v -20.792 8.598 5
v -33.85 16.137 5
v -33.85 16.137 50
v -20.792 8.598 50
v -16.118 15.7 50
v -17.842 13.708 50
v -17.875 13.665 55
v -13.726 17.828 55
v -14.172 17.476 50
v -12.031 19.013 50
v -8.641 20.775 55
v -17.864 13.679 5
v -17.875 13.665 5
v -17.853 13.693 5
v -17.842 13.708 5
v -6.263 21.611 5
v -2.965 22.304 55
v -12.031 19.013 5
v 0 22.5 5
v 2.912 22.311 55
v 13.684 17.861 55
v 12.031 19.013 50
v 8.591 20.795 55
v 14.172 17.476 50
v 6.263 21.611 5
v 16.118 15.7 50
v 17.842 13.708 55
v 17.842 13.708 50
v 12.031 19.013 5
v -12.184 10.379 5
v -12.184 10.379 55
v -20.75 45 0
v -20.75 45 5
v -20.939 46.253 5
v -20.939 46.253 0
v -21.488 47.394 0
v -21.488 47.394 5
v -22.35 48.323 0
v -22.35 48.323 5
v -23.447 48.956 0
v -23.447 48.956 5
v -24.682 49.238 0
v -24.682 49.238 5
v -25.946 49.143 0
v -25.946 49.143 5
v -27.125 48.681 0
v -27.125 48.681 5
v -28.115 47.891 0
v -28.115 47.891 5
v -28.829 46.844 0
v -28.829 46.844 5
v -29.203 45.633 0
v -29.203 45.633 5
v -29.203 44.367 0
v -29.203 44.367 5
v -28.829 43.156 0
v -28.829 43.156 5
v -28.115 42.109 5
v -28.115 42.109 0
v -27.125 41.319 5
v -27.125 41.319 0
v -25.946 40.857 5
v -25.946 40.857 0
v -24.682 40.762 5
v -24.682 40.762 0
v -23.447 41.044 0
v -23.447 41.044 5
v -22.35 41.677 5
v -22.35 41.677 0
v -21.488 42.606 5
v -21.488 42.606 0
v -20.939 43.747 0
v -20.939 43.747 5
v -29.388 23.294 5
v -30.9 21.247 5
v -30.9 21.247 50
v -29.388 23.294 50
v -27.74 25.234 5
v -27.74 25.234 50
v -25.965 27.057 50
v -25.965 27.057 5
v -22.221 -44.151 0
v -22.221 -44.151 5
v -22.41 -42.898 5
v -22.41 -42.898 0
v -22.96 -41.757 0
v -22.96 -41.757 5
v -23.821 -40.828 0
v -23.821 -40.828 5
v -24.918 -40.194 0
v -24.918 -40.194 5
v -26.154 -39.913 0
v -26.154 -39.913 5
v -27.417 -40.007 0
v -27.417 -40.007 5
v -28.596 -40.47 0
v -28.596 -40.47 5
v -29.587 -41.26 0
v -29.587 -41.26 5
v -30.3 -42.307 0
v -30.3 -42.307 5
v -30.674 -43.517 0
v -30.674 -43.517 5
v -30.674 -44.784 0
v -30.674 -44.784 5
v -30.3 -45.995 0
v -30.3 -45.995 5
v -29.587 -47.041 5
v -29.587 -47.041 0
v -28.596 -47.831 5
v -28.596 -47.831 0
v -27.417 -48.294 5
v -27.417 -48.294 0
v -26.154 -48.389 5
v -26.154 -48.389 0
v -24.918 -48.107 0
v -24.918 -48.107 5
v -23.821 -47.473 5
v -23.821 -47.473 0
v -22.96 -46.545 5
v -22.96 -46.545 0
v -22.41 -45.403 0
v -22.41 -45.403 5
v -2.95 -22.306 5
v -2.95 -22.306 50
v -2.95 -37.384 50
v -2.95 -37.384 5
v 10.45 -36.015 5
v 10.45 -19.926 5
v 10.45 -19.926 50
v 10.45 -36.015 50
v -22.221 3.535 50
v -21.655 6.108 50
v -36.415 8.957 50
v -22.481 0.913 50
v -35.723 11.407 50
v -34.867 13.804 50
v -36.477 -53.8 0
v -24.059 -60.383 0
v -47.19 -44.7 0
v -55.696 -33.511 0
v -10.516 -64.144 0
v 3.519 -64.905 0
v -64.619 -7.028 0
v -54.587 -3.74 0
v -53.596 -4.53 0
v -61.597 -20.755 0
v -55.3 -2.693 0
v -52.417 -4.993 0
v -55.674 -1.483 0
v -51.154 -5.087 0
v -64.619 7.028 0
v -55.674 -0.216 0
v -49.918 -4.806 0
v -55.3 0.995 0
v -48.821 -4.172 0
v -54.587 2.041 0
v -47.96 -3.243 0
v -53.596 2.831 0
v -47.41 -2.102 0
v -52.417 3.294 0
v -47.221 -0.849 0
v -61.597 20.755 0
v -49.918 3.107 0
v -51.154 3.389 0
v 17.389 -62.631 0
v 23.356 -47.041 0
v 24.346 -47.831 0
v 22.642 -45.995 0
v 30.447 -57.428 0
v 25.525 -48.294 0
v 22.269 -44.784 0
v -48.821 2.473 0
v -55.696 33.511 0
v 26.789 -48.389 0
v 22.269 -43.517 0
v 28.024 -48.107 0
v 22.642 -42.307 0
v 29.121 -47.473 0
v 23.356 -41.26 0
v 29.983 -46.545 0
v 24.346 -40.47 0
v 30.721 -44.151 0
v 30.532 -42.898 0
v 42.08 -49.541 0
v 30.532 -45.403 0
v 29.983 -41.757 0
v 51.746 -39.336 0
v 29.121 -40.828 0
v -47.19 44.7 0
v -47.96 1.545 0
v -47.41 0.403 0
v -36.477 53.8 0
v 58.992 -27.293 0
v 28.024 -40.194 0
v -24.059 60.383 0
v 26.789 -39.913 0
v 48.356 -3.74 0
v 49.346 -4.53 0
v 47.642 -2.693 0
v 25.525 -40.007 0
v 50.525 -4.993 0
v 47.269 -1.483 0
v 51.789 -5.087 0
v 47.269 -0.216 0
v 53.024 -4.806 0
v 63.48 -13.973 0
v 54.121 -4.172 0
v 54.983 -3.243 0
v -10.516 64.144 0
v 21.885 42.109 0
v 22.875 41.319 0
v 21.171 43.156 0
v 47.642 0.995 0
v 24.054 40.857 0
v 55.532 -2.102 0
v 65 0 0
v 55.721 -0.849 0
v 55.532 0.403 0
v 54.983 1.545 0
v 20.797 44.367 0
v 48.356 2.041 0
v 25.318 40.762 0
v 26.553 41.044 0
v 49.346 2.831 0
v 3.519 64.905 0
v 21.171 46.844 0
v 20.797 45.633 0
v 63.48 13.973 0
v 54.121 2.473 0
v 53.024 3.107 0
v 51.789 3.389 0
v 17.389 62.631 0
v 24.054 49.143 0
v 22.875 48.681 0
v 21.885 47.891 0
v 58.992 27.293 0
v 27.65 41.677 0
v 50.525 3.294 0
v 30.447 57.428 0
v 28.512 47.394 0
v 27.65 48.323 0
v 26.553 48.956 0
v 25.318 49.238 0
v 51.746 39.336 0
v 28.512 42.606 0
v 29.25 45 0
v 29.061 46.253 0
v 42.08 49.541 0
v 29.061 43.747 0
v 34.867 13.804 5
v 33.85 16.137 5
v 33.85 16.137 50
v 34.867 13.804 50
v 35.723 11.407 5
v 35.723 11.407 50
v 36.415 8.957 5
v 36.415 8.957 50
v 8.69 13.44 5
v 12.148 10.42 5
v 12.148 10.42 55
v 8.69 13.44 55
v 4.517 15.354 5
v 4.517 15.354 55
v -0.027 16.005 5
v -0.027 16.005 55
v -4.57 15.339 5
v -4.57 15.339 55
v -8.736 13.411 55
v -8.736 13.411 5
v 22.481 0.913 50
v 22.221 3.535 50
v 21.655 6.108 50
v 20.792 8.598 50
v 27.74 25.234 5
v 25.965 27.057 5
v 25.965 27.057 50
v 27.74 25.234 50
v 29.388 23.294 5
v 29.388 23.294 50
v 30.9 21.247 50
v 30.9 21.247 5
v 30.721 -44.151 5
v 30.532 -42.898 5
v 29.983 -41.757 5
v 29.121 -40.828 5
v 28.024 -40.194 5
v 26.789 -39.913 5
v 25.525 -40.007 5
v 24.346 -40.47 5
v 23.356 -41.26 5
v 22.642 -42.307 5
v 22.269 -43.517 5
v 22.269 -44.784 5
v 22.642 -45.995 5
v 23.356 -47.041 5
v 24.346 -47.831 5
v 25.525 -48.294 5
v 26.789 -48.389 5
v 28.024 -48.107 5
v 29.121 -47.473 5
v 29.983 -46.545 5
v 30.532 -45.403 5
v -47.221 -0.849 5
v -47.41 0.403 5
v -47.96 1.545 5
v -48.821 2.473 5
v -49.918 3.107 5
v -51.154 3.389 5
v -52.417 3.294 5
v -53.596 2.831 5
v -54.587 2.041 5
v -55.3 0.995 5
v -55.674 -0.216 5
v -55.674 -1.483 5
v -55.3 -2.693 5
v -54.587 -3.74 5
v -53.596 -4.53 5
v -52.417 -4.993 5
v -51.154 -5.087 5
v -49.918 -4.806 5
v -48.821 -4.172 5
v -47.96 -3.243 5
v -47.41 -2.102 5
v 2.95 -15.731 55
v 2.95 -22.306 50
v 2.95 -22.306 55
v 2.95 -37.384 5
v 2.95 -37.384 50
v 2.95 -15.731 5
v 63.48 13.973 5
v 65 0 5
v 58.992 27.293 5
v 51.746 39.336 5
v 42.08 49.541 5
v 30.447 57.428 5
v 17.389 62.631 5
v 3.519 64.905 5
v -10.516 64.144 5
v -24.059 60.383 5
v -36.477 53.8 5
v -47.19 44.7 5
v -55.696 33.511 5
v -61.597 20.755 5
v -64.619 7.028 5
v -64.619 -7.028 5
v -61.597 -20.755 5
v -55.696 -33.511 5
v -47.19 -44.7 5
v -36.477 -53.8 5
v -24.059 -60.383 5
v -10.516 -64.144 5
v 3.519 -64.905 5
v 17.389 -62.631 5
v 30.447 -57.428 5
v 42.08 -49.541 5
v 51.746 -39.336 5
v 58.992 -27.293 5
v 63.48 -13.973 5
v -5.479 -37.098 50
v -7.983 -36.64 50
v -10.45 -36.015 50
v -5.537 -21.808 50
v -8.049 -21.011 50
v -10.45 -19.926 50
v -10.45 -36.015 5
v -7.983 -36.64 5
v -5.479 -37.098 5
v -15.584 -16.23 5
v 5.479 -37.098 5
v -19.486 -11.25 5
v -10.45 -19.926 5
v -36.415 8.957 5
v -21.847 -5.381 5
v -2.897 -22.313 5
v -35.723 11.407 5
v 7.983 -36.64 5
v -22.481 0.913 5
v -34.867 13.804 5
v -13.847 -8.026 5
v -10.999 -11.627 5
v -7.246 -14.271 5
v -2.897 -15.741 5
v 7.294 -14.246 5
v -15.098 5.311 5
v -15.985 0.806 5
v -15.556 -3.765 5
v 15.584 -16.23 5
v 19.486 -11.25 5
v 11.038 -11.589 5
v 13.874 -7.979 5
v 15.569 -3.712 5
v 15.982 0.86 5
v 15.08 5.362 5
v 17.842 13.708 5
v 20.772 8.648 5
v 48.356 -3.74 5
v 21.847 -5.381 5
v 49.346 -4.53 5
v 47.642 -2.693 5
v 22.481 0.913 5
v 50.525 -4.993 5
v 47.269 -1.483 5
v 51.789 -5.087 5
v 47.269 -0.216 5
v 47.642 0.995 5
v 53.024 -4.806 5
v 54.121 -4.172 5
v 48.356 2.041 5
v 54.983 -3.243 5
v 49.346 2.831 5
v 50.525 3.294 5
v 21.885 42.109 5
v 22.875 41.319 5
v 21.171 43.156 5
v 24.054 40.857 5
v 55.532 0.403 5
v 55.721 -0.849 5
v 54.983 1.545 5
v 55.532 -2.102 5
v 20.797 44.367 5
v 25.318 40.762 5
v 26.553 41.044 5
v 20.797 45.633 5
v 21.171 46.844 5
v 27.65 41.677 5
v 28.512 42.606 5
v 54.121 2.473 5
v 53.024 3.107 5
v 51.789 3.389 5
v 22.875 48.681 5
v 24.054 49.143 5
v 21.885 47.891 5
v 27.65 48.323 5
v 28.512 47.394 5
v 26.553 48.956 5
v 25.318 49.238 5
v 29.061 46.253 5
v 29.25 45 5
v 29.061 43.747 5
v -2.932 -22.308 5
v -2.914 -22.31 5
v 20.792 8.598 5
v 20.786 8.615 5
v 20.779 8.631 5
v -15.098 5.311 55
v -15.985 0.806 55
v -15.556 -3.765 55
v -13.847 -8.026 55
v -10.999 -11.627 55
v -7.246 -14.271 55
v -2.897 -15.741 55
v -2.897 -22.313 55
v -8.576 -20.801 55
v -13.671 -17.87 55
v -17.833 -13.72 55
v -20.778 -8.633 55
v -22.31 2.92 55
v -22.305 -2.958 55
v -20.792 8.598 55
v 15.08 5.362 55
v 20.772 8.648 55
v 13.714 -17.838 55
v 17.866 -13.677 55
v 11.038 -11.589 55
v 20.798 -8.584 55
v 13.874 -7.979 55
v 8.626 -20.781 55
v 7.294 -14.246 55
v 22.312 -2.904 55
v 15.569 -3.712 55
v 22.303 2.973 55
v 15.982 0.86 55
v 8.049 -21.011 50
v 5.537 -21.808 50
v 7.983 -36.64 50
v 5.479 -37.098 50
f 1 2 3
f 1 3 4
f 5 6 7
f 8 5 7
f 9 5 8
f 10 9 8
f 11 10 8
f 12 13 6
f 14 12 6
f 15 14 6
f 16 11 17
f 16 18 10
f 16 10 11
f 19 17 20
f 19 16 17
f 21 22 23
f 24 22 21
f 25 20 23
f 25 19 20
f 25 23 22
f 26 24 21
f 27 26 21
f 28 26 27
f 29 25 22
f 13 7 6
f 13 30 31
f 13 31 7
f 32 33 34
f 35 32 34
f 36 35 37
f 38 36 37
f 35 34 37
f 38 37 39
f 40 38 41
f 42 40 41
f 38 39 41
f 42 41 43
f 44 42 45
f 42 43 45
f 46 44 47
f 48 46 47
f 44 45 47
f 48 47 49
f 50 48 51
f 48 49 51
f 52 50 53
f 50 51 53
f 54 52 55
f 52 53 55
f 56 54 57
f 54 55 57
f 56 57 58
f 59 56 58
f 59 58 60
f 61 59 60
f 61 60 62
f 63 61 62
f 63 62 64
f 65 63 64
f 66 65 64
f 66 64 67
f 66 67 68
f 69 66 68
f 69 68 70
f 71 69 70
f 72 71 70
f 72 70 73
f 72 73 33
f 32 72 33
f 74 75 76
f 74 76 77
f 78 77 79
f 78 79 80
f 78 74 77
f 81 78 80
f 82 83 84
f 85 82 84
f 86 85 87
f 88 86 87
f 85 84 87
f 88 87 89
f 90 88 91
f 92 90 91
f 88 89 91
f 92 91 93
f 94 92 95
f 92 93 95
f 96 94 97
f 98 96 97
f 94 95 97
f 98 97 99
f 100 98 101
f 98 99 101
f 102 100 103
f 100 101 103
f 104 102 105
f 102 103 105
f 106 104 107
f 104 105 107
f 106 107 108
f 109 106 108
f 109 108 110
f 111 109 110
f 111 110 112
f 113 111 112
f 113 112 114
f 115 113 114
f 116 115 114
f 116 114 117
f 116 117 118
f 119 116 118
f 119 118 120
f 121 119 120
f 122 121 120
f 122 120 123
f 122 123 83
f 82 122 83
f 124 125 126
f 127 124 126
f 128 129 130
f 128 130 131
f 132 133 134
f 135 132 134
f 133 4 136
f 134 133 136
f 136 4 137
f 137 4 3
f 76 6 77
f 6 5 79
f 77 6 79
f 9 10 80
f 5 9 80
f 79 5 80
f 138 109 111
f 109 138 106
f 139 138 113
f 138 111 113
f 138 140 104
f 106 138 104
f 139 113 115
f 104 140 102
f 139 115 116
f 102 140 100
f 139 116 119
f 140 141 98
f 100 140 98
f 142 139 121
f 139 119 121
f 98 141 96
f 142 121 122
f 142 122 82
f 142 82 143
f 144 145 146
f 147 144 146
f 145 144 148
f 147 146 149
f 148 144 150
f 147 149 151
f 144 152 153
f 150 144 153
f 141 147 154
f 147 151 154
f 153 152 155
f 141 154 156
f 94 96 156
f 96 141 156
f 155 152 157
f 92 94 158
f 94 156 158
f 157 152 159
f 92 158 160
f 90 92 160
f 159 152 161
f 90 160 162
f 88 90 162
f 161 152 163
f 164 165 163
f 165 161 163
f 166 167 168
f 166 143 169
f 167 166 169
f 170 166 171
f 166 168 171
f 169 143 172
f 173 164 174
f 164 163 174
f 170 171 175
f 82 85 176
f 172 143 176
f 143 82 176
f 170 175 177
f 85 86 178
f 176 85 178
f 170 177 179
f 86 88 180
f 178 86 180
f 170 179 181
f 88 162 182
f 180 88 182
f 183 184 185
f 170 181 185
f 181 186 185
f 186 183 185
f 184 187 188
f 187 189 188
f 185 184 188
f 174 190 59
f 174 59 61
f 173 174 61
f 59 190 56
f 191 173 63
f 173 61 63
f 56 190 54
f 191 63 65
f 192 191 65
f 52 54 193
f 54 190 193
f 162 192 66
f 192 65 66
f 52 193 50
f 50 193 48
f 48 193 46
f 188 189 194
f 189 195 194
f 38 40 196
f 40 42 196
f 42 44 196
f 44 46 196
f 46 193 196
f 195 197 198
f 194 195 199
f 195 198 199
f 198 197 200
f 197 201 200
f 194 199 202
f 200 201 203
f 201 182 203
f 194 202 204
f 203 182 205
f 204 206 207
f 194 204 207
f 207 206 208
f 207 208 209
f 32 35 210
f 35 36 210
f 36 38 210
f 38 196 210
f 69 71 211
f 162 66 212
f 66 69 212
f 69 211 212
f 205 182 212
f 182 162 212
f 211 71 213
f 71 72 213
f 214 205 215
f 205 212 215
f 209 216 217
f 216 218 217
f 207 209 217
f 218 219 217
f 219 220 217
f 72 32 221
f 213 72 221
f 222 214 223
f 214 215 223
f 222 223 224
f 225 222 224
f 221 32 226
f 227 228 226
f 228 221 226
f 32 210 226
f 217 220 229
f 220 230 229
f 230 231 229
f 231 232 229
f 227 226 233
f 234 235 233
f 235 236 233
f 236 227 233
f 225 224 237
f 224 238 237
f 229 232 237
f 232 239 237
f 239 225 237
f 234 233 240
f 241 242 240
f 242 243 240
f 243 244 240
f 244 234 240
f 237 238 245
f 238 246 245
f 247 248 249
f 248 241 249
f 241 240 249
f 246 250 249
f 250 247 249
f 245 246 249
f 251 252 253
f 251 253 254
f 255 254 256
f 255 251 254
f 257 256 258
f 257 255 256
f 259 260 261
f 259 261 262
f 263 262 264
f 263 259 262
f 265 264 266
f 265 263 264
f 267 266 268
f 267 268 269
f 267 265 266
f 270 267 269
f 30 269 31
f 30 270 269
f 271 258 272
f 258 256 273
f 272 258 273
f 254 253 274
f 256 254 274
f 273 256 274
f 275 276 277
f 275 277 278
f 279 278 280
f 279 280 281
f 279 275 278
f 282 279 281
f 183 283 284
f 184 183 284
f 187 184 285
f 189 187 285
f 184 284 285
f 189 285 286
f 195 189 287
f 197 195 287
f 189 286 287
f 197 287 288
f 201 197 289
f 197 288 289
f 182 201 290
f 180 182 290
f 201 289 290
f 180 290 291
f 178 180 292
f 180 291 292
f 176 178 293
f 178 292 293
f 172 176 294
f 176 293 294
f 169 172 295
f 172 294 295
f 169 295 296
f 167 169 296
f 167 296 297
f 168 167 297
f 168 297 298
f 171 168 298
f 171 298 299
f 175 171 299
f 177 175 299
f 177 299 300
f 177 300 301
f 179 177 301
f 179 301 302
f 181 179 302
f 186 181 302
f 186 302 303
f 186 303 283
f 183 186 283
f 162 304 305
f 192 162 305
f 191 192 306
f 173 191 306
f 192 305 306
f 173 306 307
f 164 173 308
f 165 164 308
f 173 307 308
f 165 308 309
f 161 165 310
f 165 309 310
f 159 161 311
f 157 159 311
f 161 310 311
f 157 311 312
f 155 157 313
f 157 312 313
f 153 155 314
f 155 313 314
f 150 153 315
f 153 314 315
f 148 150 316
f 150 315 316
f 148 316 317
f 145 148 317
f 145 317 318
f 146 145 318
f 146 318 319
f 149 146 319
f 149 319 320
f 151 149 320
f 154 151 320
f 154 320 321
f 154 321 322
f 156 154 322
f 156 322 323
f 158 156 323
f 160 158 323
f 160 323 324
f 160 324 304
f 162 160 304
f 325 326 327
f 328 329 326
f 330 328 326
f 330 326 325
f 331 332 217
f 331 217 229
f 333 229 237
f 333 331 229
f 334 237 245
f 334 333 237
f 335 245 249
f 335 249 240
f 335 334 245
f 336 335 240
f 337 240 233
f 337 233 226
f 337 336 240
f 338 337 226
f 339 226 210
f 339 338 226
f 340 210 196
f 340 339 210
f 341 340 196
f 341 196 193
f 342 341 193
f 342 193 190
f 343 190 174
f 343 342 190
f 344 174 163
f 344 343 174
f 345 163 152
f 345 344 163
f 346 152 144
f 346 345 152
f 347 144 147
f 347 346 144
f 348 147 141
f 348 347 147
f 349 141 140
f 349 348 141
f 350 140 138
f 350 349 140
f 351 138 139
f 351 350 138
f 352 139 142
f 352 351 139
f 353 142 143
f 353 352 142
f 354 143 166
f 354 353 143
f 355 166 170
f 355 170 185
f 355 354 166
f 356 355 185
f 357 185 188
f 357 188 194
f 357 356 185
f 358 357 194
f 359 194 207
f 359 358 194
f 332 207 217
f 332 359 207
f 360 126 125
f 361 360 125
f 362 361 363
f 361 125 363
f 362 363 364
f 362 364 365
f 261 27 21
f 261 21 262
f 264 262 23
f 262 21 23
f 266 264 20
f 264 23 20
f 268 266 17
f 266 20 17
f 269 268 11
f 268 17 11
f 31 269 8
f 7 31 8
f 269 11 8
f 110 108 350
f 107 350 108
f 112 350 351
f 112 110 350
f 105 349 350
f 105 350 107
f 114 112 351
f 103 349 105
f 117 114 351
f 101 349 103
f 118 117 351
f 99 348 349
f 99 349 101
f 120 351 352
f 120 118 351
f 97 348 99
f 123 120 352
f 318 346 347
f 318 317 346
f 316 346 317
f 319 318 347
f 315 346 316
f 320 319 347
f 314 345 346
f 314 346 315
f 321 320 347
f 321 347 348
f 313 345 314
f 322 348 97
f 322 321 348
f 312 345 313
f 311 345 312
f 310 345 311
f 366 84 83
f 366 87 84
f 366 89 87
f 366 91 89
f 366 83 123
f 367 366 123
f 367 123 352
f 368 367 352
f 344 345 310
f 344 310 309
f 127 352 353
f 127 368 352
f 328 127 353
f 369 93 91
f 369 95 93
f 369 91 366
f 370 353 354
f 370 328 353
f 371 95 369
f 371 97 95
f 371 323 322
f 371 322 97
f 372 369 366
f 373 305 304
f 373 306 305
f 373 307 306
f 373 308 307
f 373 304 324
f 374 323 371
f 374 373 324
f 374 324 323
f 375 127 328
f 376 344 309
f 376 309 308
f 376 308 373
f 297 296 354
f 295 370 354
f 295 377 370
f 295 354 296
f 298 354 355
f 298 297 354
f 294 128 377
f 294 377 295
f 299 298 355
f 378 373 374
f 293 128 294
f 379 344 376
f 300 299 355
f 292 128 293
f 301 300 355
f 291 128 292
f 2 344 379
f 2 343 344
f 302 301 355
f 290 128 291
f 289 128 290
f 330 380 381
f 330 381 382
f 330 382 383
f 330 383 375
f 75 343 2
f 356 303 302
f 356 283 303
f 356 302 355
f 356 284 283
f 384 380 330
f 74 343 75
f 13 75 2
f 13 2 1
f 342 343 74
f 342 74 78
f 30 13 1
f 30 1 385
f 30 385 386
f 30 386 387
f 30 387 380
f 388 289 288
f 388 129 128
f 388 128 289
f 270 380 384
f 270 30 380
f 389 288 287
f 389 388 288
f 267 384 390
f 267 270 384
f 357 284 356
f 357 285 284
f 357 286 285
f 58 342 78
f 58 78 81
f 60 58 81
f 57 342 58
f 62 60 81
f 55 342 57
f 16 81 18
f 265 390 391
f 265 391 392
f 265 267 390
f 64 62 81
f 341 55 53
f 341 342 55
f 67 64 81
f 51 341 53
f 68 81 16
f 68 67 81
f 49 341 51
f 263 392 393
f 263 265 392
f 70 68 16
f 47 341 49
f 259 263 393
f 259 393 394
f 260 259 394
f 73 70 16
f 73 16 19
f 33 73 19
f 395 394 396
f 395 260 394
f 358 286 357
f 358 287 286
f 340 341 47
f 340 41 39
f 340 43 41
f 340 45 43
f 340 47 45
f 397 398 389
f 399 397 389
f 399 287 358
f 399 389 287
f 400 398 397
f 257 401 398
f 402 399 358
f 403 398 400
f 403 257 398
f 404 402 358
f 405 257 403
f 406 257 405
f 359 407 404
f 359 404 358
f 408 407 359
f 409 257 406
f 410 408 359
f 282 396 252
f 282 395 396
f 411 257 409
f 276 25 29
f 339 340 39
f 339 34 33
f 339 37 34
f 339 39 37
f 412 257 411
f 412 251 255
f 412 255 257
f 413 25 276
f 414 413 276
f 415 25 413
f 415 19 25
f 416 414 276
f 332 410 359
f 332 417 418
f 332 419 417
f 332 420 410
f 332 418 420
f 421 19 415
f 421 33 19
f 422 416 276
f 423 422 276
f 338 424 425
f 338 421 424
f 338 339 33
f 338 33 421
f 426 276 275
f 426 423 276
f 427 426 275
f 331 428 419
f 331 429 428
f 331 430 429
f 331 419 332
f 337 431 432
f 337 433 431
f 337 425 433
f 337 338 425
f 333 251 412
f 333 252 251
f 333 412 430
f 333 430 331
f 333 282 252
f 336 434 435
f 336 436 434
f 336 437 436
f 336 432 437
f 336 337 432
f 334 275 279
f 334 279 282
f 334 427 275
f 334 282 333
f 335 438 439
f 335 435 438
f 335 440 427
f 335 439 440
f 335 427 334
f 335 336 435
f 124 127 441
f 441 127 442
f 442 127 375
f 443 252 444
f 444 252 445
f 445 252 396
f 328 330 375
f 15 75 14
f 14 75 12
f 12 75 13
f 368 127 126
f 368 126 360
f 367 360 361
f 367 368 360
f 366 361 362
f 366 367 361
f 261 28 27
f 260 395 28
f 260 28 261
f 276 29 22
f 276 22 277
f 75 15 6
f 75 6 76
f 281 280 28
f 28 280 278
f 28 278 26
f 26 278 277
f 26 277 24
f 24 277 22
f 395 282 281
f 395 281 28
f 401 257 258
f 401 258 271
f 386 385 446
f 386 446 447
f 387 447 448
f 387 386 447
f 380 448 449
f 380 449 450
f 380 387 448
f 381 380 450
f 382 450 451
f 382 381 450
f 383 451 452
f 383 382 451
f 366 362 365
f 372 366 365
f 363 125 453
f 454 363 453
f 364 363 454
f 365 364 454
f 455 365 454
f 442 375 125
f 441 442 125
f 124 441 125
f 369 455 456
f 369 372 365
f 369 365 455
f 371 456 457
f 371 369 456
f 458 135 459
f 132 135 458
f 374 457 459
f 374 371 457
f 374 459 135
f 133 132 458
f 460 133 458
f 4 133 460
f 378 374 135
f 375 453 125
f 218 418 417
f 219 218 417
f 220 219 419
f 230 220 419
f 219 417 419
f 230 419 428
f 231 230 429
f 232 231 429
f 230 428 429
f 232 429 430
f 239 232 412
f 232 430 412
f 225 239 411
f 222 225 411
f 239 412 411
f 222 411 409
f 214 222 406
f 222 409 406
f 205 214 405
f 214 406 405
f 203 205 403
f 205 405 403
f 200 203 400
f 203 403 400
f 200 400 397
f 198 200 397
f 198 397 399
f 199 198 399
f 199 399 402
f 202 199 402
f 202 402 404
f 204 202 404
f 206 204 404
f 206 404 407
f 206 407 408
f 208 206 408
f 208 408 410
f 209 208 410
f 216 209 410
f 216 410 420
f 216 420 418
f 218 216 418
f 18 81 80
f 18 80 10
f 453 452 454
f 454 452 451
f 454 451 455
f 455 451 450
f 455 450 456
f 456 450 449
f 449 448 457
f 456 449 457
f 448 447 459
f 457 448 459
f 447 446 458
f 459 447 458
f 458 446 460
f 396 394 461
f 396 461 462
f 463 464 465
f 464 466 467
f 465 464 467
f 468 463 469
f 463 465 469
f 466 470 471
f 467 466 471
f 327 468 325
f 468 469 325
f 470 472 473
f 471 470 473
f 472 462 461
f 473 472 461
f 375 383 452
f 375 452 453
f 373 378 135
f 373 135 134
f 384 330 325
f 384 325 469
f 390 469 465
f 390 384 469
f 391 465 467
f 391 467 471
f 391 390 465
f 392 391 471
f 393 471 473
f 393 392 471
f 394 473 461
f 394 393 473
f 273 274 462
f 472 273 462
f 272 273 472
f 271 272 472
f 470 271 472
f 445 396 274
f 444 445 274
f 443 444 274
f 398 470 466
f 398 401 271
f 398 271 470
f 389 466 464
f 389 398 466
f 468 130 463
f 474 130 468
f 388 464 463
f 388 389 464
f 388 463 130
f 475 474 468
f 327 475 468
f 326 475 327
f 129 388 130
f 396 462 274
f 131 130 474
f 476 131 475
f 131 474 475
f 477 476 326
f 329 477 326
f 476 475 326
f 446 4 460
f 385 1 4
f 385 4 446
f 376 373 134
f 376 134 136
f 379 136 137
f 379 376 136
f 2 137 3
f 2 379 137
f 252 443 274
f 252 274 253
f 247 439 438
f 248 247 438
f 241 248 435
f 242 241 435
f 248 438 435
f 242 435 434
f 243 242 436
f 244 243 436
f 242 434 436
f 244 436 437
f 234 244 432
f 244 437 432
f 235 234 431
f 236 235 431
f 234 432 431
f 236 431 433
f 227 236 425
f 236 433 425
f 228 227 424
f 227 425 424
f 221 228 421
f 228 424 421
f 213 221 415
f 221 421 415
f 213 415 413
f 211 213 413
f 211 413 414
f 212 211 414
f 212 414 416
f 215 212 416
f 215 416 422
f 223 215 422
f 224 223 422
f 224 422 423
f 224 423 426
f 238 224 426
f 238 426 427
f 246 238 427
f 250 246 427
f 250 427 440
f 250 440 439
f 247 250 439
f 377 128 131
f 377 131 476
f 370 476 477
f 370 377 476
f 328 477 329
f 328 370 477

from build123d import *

# Parameters (mm, degrees)
SKETCH1_R            = 65
BOSS_EXTRUDE1_DEPTH  = 5
BOSS_EXTRUDE2_DEPTH  = 50
BOSS_EXTRUDE3_DEPTH  = 45
BOSS_EXTRUDE4_DEPTH  = 45
BOSS_EXTRUDE6_DEPTH  = 45
BOSS_EXTRUDE7_DEPTH  = 45
BOSS_EXTRUDE9_DEPTH  = 45
BOSS_EXTRUDE10_DEPTH = 45
SKETCH11_R           = 4.25
CUT_EXTRUDE1_DEPTH   = 10


with BuildPart() as part:
    # Sketch1 → Boss-Extrude1 (new body)
    with BuildSketch(Plane.XY.offset(5)):
        Circle(SKETCH1_R)
    extrude(amount=-BOSS_EXTRUDE1_DEPTH)

    # Sketch2 → Boss-Extrude2 (add)
    with BuildSketch(Plane.XY.offset(5)):
        with BuildLine():
            Line((-2.896618782, -15.740746549), (-2.896618782, -22.312767637))
            ThreePointArc((-2.896618782, -22.312767637), (-19.472098251, -11.273304294), (-20.792365892, 8.598111457))
            Line((-20.792365892, 8.598111457), (-15.098298122, 5.310639897))
            ThreePointArc((-15.098298122, 5.310639897), (-13.847182977, -8.026021796), (-2.896618782, -15.740746549))
        make_face()
        with BuildLine():
            Line((17.842365892, 13.707661339), (12.148298122, 10.420189779))
            ThreePointArc((12.148298122, 10.420189779), (-0.027147278, 16.005023127), (-12.183576995, 10.378918724))
            Line((-12.183576995, 10.378918724), (-17.875114212, 13.664929269))
            ThreePointArc((-17.875114212, 13.664929269), (-0.026918777, 22.499983897), (17.842365892, 13.707661339))
        make_face()
        with BuildLine():
            Line((2.95, -22.305772795), (2.95, -15.730829675))
            ThreePointArc((2.95, -15.730829675), (13.874330255, -7.979001331), (15.080195777, 5.361827824))
            Line((15.080195777, 5.361827824), (20.771732993, 8.647838368))
            ThreePointArc((20.771732993, 8.647838368), (19.499017028, -11.226679604), (2.95, -22.305772795))
        make_face()
    extrude(amount=BOSS_EXTRUDE2_DEPTH)

    # Sketch3 → Boss-Extrude3 (add)
    with BuildSketch(Plane.XY.offset(5)):
        with BuildLine():
            Line((-33.850308879, 16.137118355), (-20.792365892, 8.598111457))
            ThreePointArc((-20.792365892, 8.598111457), (-21.975466771, 4.82999588), (-22.481466179, 0.913059924))
            Line((-22.481466179, 0.913059924), (-36.414511458, 8.957307367))
            ThreePointArc((-36.414511458, 8.957307367), (-35.315346037, 12.612546701), (-33.850308879, 16.137118355))
        make_face()
    extrude(amount=BOSS_EXTRUDE3_DEPTH)

    # Sketch4 → Boss-Extrude4 (add)
    with BuildSketch(Plane.XY.offset(5)):
        with BuildLine():
            Line((-10.45, -36.014545673), (-10.45, -19.926050788))
            ThreePointArc((-10.45, -19.926050788), (-6.804834253, -21.446310424), (-2.95, -22.305772795))
            Line((-2.95, -22.305772795), (-2.95, -37.383786593))
            ThreePointArc((-2.95, -37.383786593), (-6.734887169, -36.890260162), (-10.45, -36.014545673))
        make_face()
    extrude(amount=BOSS_EXTRUDE4_DEPTH)

    # Sketch6 → Boss-Extrude6 (add)
    with BuildSketch(Plane.XY.offset(5)):
        with BuildLine():
            Line((30.900308879, 21.246668237), (17.842365892, 13.707661339))
            ThreePointArc((17.842365892, 13.707661339), (15.170632518, 16.616314543), (12.031466179, 19.012990863))
            Line((12.031466179, 19.012990863), (25.964511458, 27.057238306))
            ThreePointArc((25.964511458, 27.057238306), (28.580458868, 24.277713461), (30.900308879, 21.246668237))
        make_face()
    extrude(amount=BOSS_EXTRUDE6_DEPTH)

    # Sketch7 → Boss-Extrude7 (add)
    with BuildSketch(Plane.XY.offset(5)):
        with BuildLine():
            Line((-25.964511458, 27.057238306), (-12.031466179, 19.012990863))
            ThreePointArc((-12.031466179, 19.012990863), (-15.170632518, 16.616314543), (-17.842365892, 13.707661339))
            Line((-17.842365892, 13.707661339), (-30.900308879, 21.246668237))
            ThreePointArc((-30.900308879, 21.246668237), (-28.580458868, 24.277713461), (-25.964511458, 27.057238306))
        make_face()
    extrude(amount=BOSS_EXTRUDE7_DEPTH)

    # Sketch9 → Boss-Extrude9 (add)
    with BuildSketch(Plane.XY.offset(5)):
        with BuildLine():
            Line((2.95, -37.383786593), (2.95, -22.305772795))
            ThreePointArc((2.95, -22.305772795), (6.804834253, -21.446310424), (10.45, -19.926050788))
            Line((10.45, -19.926050788), (10.45, -36.014545673))
            ThreePointArc((10.45, -36.014545673), (6.734887169, -36.890260162), (2.95, -37.383786593))
        make_face()
    extrude(amount=BOSS_EXTRUDE9_DEPTH)

    # Sketch10 → Boss-Extrude10 (add)
    with BuildSketch(Plane.XY.offset(5)):
        with BuildLine():
            Line((36.414511458, 8.957307367), (22.481466179, 0.913059924))
            ThreePointArc((22.481466179, 0.913059924), (21.975466771, 4.82999588), (20.792365892, 8.598111457))
            Line((20.792365892, 8.598111457), (33.850308879, 16.137118355))
            ThreePointArc((33.850308879, 16.137118355), (35.315346037, 12.612546701), (36.414511458, 8.957307367))
        make_face()
    extrude(amount=BOSS_EXTRUDE10_DEPTH)

    # Sketch11 → Cut-Extrude1 (cut)
    with BuildSketch(Plane.XY.offset(5)):
        with Locations((-25, 45)):
            Circle(SKETCH11_R)
        with Locations((25, 45)):
            Circle(SKETCH11_R)
        with Locations((26.47114317, -44.150635095)):
            Circle(SKETCH11_R)
        with Locations((51.47114317, -0.849364905)):
            Circle(SKETCH11_R)
        with Locations((-51.47114317, -0.849364905)):
            Circle(SKETCH11_R)
        with Locations((-26.47114317, -44.150635095)):
            Circle(SKETCH11_R)
    extrude(amount=-CUT_EXTRUDE1_DEPTH, mode=Mode.SUBTRACT)


solid = part.part
